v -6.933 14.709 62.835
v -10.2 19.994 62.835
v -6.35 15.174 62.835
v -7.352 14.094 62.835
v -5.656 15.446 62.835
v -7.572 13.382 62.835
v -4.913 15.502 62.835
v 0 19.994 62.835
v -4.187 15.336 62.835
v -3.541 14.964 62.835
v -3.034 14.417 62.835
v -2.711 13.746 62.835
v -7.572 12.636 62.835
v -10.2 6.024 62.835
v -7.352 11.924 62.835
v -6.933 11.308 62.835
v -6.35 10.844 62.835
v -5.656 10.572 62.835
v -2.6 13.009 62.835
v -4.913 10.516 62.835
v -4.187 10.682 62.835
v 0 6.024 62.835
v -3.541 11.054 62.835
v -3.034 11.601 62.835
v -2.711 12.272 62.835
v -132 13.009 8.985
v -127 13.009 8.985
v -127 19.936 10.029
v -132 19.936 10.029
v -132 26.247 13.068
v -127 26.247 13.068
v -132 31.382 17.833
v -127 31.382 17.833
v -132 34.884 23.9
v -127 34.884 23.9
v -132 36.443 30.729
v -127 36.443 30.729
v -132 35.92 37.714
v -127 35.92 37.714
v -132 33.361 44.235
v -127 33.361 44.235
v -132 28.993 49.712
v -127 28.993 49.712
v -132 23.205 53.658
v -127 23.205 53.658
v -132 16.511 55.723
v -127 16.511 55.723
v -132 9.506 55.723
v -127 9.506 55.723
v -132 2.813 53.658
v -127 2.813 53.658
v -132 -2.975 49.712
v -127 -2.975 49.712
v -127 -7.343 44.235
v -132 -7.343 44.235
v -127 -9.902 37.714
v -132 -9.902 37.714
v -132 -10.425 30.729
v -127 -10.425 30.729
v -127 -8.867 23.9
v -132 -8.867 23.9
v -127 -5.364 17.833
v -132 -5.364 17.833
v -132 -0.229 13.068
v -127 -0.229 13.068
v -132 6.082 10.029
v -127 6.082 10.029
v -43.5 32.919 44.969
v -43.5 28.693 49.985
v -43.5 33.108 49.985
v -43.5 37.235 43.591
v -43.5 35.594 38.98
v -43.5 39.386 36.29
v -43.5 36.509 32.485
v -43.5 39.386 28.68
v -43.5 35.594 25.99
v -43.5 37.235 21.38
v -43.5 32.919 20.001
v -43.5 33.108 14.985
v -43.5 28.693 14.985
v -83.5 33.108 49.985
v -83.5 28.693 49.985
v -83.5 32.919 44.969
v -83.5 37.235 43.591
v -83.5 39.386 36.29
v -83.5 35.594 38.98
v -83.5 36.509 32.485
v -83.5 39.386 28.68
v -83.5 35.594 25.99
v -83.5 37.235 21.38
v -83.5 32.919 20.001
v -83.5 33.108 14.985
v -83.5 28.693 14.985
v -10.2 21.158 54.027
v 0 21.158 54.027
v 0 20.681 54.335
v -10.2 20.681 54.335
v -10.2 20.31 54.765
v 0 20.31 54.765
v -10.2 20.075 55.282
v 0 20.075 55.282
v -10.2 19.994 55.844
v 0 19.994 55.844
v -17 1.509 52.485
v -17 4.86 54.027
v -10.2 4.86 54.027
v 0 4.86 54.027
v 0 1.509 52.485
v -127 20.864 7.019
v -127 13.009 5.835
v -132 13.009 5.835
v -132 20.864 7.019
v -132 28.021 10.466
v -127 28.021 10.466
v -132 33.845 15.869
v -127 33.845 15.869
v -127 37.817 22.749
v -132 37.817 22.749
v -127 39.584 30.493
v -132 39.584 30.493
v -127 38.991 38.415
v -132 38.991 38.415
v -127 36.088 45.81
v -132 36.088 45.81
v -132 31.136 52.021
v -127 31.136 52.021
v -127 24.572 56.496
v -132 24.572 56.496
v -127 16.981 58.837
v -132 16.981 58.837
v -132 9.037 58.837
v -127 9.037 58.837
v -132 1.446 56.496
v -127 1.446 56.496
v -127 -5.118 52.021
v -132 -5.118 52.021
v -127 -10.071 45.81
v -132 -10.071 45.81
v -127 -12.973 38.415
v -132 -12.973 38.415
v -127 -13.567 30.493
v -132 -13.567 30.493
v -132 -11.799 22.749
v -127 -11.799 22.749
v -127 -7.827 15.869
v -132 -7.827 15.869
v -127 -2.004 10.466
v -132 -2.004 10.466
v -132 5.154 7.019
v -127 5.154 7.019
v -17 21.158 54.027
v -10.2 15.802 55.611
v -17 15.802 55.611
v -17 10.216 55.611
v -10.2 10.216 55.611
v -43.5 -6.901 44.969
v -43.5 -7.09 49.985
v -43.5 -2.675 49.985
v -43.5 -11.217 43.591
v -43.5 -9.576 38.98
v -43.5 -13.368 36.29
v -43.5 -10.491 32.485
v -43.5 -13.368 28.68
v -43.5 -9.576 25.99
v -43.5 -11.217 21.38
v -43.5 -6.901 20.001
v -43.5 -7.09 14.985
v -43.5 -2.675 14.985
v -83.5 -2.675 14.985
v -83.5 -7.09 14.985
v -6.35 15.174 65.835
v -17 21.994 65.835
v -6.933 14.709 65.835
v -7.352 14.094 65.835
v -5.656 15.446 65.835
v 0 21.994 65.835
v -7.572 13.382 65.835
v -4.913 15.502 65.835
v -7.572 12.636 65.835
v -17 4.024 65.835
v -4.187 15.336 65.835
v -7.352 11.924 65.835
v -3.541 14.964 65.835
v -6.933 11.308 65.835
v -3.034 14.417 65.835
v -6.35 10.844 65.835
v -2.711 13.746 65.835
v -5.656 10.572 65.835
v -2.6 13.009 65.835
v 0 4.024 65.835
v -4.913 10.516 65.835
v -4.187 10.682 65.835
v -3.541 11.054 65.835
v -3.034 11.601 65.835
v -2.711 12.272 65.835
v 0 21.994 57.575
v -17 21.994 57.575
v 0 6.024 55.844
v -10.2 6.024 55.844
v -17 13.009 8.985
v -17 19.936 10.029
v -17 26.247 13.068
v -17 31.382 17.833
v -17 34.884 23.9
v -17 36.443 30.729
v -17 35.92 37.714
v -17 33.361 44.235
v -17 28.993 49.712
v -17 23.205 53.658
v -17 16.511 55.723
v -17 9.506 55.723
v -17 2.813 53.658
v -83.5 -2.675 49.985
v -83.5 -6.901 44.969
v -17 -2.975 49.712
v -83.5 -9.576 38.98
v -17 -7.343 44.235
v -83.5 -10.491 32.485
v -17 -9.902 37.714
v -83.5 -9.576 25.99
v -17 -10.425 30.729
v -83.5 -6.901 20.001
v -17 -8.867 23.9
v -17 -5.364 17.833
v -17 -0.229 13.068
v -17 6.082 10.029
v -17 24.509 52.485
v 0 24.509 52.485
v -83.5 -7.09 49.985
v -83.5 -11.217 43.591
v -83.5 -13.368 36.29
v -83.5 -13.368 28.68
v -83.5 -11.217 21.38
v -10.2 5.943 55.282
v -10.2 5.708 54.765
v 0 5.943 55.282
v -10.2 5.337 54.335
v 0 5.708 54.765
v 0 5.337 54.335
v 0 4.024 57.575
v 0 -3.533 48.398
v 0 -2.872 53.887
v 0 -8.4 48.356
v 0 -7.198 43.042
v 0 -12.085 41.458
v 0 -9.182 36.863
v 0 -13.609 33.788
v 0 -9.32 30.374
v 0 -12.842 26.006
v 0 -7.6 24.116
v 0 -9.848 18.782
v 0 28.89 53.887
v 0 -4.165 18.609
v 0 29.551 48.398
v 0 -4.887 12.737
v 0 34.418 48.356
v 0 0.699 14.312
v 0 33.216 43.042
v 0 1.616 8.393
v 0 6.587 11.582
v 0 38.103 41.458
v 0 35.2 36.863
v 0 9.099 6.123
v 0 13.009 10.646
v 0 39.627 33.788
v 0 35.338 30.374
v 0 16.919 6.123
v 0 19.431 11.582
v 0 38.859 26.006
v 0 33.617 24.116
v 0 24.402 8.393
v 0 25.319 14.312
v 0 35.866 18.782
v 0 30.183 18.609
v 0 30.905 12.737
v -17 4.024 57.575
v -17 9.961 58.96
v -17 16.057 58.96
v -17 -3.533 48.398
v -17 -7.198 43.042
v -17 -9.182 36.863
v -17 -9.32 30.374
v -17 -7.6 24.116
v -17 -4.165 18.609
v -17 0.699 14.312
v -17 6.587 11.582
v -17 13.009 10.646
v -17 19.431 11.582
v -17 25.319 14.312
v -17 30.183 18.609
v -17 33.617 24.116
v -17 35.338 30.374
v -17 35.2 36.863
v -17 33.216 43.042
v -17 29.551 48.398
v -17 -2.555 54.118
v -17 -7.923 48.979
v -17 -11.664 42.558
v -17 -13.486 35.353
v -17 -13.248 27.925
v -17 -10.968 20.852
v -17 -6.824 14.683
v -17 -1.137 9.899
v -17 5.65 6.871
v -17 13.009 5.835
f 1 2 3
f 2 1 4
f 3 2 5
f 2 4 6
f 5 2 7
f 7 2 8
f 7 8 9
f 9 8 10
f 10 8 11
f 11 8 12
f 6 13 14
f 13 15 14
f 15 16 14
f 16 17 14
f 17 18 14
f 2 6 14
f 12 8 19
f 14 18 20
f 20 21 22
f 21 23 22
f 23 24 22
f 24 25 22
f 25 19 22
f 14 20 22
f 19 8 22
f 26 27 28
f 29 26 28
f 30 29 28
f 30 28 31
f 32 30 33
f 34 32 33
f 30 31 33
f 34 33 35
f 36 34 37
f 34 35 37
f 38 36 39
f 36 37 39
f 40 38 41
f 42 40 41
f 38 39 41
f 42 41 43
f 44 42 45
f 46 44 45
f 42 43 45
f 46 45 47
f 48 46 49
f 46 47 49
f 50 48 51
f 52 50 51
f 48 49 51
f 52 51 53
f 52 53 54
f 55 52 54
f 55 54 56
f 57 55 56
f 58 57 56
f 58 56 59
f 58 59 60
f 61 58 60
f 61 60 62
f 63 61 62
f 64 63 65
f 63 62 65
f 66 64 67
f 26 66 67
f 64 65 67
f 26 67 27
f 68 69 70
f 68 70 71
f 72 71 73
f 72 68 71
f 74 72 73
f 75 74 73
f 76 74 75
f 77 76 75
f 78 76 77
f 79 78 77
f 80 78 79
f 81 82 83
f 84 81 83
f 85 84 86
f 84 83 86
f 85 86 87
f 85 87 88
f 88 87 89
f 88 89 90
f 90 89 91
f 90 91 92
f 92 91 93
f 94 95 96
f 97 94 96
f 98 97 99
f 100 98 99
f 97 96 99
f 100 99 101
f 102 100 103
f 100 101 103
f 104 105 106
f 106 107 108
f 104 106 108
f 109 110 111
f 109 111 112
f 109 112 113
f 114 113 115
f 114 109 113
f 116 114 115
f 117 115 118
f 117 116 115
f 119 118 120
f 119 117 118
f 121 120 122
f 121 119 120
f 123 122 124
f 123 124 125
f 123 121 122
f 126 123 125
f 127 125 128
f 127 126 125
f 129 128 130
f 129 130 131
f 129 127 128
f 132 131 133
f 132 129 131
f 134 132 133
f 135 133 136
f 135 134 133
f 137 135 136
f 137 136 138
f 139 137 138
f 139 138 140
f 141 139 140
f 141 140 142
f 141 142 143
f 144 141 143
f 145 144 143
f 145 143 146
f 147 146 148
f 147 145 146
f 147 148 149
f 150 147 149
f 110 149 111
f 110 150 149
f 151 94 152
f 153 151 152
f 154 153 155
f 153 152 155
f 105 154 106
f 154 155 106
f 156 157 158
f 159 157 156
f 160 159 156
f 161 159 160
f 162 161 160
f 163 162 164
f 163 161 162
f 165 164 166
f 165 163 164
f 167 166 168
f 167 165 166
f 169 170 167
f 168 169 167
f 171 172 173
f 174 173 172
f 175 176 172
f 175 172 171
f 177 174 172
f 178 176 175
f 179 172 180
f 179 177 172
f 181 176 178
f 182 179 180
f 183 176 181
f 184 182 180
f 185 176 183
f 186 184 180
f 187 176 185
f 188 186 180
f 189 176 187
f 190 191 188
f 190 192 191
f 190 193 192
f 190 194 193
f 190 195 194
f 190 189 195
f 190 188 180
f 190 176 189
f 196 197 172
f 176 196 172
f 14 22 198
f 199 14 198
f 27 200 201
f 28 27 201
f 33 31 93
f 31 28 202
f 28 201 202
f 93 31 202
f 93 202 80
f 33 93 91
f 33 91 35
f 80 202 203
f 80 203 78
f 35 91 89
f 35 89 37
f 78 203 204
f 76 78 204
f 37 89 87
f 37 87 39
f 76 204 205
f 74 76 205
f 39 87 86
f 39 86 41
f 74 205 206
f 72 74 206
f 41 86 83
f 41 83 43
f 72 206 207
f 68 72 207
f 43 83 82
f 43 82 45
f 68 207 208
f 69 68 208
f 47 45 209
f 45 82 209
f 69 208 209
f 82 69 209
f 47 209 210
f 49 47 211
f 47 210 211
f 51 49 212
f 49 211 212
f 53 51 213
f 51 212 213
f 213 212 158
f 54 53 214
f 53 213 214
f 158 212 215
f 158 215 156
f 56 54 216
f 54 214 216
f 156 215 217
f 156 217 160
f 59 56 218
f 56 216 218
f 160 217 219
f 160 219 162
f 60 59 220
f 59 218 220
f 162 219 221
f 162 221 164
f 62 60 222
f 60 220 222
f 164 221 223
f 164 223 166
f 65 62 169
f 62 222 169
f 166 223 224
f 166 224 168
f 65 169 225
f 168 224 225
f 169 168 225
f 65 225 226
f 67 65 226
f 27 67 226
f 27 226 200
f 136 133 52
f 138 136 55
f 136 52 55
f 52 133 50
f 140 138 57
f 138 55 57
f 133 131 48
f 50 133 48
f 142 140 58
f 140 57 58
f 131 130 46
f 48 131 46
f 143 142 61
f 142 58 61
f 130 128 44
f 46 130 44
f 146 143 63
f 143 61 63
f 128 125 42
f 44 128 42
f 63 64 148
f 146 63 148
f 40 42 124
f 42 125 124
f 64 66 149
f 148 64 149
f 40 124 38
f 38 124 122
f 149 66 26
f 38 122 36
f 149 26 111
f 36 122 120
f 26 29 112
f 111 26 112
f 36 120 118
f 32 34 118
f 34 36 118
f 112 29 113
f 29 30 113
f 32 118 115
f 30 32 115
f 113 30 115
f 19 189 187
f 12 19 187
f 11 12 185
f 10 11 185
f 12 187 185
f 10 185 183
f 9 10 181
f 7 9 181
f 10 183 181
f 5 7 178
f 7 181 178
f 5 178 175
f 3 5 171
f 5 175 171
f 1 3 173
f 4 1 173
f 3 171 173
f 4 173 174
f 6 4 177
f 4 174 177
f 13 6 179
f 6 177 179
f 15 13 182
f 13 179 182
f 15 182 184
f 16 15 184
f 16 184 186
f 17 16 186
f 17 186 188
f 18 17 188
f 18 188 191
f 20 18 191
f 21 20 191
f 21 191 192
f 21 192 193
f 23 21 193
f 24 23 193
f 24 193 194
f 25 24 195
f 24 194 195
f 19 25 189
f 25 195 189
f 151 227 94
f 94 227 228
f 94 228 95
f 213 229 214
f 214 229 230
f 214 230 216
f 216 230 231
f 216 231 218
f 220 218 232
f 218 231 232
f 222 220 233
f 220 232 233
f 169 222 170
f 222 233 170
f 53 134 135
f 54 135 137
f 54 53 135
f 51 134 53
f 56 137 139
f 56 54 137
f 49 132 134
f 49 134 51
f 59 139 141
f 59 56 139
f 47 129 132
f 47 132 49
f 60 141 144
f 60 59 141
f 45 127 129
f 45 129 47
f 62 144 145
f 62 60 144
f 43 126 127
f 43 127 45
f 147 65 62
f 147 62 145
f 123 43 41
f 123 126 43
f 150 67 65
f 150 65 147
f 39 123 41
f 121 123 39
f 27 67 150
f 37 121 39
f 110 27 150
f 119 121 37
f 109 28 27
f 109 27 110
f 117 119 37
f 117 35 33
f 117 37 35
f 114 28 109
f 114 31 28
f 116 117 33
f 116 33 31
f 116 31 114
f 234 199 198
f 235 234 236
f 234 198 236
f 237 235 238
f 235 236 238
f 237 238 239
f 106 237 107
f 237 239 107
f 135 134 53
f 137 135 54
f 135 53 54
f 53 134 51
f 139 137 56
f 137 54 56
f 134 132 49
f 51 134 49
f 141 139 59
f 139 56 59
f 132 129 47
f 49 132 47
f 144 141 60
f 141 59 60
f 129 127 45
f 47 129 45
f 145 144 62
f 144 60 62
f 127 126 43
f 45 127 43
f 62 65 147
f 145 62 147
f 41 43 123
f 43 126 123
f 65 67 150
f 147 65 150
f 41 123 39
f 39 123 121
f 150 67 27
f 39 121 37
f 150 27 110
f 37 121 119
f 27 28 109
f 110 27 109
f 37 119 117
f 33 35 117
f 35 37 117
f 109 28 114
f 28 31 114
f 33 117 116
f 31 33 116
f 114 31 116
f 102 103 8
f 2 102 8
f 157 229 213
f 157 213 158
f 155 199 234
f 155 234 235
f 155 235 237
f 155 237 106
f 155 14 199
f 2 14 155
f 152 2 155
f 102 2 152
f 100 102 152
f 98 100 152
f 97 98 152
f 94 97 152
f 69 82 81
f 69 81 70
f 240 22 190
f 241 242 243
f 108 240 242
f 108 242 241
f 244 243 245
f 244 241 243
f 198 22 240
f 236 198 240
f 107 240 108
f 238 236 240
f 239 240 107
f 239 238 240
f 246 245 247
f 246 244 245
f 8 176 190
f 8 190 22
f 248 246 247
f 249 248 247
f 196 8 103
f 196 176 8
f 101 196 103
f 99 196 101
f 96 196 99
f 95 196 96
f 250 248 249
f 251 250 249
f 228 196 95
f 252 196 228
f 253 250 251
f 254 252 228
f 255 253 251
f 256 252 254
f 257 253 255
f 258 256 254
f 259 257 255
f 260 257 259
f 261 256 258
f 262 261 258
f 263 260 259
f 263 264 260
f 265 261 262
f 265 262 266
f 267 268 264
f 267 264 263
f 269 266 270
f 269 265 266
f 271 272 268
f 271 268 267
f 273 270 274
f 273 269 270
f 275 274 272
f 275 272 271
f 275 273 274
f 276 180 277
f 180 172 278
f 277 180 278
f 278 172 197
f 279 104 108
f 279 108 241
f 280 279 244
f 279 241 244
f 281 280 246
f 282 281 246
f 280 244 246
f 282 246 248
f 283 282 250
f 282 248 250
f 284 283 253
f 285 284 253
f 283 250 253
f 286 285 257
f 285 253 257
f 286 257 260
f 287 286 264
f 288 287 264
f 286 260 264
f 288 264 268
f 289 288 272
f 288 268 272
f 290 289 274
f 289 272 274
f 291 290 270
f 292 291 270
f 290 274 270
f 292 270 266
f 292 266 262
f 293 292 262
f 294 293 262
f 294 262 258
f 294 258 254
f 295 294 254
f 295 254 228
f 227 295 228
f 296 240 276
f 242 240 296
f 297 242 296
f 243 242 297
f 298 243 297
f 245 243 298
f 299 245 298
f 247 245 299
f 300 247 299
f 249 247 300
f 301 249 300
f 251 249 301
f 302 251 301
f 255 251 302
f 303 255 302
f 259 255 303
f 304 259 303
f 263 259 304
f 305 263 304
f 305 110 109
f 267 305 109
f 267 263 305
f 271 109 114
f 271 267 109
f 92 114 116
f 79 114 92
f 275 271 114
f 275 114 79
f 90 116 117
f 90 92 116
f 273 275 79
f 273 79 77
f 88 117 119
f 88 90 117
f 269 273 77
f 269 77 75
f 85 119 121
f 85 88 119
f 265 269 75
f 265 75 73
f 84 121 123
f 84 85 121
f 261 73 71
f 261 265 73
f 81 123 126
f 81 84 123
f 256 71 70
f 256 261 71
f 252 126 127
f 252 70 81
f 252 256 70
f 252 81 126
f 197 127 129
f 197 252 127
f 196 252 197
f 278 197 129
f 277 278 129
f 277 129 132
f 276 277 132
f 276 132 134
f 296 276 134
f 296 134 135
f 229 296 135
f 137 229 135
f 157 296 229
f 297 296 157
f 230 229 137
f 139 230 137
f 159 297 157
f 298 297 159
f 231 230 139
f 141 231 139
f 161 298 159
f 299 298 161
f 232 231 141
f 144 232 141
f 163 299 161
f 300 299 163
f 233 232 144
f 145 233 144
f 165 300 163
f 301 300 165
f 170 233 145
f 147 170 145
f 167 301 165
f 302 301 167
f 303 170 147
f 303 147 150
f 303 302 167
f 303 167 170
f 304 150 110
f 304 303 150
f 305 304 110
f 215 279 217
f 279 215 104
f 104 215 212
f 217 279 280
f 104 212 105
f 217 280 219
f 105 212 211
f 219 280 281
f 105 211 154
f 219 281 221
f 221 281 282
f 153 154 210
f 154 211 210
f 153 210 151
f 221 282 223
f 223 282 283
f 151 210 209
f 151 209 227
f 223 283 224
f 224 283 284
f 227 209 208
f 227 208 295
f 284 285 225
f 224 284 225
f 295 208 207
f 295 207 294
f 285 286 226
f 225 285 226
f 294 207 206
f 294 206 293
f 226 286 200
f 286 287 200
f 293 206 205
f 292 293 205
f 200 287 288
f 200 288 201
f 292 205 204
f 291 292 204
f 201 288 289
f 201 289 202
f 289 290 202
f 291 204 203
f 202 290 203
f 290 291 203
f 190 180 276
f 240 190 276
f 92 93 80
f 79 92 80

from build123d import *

# Parameters (mm, degrees)
BOSS_EXTRUDE4_DEPTH     = 10.2
CUT_EXTRUDE2_START      = 65.835033
SKETCH6_R               = 2.5
CUT_EXTRUDE2_DEPTH      = 3
BOSS_EXTRUDE2_START     = -10.2
BOSS_EXTRUDE2_DEPTH     = 6.8
BOSS_EXTRUDE3_START     = -17
SKETCH9_R               = 26.65
SKETCH9_R_2             = 23.5
BOSS_EXTRUDE3_DEPTH     = 110
BOSS_EXTRUDE5_START     = -127
SKETCH9_2_R             = 26.65
SKETCH9_2_R_2           = 23.5
BOSS_EXTRUDE5_DEPTH     = 5
CUT_EXTRUDE3_DEPTH      = 153.745152921
CUT_EXTRUDE3_DEPTH_BACK = 153.745152921
SKETCH11_W              = 40
SKETCH11_H              = 35


with BuildPart() as part:
    # Sketch2 → Boss-Extrude4 (new body)
    with BuildSketch(Plane(origin=(0, 0, 0), x_dir=(0, 0, -1), z_dir=(1, 0, 0))):
        with BuildLine():
            Line((-65.835032972, 21.993922963), (-65.835032972, 4.023922963))
            Line((-65.835032972, 4.023922963), (-57.574717605, 4.023922963))
            ThreePointArc((-57.574717605, 4.023922963), (-5.835032972, 13.008922963), (-57.574717605, 21.993922963))
            Line((-57.574717605, 21.993922963), (-65.835032972, 21.993922963))
        make_face()
        with BuildLine():
            Line((-62.835032972, 19.993922963), (-62.835032972, 6.023922963))
            Line((-62.835032972, 6.023922963), (-55.844102472, 6.023922963))
            ThreePointArc((-55.844102472, 6.023922963), (-54.765274922, 5.708004647), (-54.027268755, 4.860054081))
            Line((-54.027268755, 4.860054081), (-52.485033553, 1.508923075))
            ThreePointArc((-52.485033553, 1.508923075), (-10.645953881, 13.008922963), (-52.485033553, 24.508922852))
            Line((-52.485033553, 24.508922852), (-54.027268755, 21.157791846))
            ThreePointArc((-54.027268755, 21.157791846), (-54.765274922, 20.30984128), (-55.844102472, 19.993922963))
            Line((-55.844102472, 19.993922963), (-62.835032972, 19.993922963))
        make_face(mode=Mode.SUBTRACT)
    extrude(amount=-BOSS_EXTRUDE4_DEPTH)

    # Sketch6 → Cut-Extrude2 (cut)
    with BuildSketch(Plane.XY.offset(CUT_EXTRUDE2_START)):
        with Locations((-5.1, 13.008922963)):
            Circle(SKETCH6_R)
    extrude(amount=-CUT_EXTRUDE2_DEPTH, mode=Mode.SUBTRACT)

    # Sketch8 → Boss-Extrude2 (add)
    with BuildSketch(Plane(origin=(0, 0, 0), x_dir=(0, 0, -1), z_dir=(1, 0, 0)).offset(BOSS_EXTRUDE2_START)):
        with BuildLine():
            Line((-57.574717605, 21.993922963), (-65.835032972, 21.993922963))
            Line((-65.835032972, 21.993922963), (-65.835032972, 4.023922963))
            Line((-65.835032972, 4.023922963), (-57.574717605, 4.023922963))
            ThreePointArc((-57.574717605, 4.023922963), (-5.835032972, 13.008922963), (-57.574717605, 21.993922963))
        make_face()
        with BuildLine():
            Line((-54.027268755, 4.860054081), (-52.485033553, 1.508923075))
            ThreePointArc((-52.485033553, 1.508923075), (-10.645953881, 13.008922963), (-52.485033553, 24.508922852))
            Line((-52.485033553, 24.508922852), (-54.027268755, 21.157791846))
            ThreePointArc((-54.027268755, 21.157791846), (-55.812393115, 13.008922963), (-54.027268755, 4.860054081))
        make_face(mode=Mode.SUBTRACT)
    extrude(amount=-BOSS_EXTRUDE2_DEPTH)

    # Sketch9 → Boss-Extrude3 (add)
    with BuildSketch(Plane(origin=(0, 0, 0), x_dir=(0, 0, -1), z_dir=(1, 0, 0)).offset(BOSS_EXTRUDE3_START)):
        with Locations((-32.485032972, 13.008922963)):
            Circle(SKETCH9_R)
        with Locations((-32.485032972, 13.008922963)):
            Circle(SKETCH9_R_2, mode=Mode.SUBTRACT)
    extrude(amount=-BOSS_EXTRUDE3_DEPTH)

    # Sketch11 → Cut-Extrude3 (cut, two sides: drawn at the far end of the back side and taken through both)
    with BuildSketch(Plane(origin=(0, 0, 0), x_dir=(1, 0, 0), z_dir=(0, 1, 0)).offset(-CUT_EXTRUDE3_DEPTH_BACK)):
        with Locations((-63.5, -32.485032972)):
            Rectangle(SKETCH11_W, SKETCH11_H)
    extrude(amount=CUT_EXTRUDE3_DEPTH + CUT_EXTRUDE3_DEPTH_BACK, mode=Mode.SUBTRACT)


with BuildPart() as body_2:
    # Sketch9<2> → Boss-Extrude5 (new body)
    with BuildSketch(Plane(origin=(0, 0, 0), x_dir=(0, 0, -1), z_dir=(1, 0, 0)).offset(BOSS_EXTRUDE5_START)):
        with Locations((-32.485032972, 13.008922963)):
            Circle(SKETCH9_2_R)
        with Locations((-32.485032972, 13.008922963)):
            Circle(SKETCH9_2_R_2, mode=Mode.SUBTRACT)
    extrude(amount=-BOSS_EXTRUDE5_DEPTH)


solid = Compound([part.part, body_2.part])
